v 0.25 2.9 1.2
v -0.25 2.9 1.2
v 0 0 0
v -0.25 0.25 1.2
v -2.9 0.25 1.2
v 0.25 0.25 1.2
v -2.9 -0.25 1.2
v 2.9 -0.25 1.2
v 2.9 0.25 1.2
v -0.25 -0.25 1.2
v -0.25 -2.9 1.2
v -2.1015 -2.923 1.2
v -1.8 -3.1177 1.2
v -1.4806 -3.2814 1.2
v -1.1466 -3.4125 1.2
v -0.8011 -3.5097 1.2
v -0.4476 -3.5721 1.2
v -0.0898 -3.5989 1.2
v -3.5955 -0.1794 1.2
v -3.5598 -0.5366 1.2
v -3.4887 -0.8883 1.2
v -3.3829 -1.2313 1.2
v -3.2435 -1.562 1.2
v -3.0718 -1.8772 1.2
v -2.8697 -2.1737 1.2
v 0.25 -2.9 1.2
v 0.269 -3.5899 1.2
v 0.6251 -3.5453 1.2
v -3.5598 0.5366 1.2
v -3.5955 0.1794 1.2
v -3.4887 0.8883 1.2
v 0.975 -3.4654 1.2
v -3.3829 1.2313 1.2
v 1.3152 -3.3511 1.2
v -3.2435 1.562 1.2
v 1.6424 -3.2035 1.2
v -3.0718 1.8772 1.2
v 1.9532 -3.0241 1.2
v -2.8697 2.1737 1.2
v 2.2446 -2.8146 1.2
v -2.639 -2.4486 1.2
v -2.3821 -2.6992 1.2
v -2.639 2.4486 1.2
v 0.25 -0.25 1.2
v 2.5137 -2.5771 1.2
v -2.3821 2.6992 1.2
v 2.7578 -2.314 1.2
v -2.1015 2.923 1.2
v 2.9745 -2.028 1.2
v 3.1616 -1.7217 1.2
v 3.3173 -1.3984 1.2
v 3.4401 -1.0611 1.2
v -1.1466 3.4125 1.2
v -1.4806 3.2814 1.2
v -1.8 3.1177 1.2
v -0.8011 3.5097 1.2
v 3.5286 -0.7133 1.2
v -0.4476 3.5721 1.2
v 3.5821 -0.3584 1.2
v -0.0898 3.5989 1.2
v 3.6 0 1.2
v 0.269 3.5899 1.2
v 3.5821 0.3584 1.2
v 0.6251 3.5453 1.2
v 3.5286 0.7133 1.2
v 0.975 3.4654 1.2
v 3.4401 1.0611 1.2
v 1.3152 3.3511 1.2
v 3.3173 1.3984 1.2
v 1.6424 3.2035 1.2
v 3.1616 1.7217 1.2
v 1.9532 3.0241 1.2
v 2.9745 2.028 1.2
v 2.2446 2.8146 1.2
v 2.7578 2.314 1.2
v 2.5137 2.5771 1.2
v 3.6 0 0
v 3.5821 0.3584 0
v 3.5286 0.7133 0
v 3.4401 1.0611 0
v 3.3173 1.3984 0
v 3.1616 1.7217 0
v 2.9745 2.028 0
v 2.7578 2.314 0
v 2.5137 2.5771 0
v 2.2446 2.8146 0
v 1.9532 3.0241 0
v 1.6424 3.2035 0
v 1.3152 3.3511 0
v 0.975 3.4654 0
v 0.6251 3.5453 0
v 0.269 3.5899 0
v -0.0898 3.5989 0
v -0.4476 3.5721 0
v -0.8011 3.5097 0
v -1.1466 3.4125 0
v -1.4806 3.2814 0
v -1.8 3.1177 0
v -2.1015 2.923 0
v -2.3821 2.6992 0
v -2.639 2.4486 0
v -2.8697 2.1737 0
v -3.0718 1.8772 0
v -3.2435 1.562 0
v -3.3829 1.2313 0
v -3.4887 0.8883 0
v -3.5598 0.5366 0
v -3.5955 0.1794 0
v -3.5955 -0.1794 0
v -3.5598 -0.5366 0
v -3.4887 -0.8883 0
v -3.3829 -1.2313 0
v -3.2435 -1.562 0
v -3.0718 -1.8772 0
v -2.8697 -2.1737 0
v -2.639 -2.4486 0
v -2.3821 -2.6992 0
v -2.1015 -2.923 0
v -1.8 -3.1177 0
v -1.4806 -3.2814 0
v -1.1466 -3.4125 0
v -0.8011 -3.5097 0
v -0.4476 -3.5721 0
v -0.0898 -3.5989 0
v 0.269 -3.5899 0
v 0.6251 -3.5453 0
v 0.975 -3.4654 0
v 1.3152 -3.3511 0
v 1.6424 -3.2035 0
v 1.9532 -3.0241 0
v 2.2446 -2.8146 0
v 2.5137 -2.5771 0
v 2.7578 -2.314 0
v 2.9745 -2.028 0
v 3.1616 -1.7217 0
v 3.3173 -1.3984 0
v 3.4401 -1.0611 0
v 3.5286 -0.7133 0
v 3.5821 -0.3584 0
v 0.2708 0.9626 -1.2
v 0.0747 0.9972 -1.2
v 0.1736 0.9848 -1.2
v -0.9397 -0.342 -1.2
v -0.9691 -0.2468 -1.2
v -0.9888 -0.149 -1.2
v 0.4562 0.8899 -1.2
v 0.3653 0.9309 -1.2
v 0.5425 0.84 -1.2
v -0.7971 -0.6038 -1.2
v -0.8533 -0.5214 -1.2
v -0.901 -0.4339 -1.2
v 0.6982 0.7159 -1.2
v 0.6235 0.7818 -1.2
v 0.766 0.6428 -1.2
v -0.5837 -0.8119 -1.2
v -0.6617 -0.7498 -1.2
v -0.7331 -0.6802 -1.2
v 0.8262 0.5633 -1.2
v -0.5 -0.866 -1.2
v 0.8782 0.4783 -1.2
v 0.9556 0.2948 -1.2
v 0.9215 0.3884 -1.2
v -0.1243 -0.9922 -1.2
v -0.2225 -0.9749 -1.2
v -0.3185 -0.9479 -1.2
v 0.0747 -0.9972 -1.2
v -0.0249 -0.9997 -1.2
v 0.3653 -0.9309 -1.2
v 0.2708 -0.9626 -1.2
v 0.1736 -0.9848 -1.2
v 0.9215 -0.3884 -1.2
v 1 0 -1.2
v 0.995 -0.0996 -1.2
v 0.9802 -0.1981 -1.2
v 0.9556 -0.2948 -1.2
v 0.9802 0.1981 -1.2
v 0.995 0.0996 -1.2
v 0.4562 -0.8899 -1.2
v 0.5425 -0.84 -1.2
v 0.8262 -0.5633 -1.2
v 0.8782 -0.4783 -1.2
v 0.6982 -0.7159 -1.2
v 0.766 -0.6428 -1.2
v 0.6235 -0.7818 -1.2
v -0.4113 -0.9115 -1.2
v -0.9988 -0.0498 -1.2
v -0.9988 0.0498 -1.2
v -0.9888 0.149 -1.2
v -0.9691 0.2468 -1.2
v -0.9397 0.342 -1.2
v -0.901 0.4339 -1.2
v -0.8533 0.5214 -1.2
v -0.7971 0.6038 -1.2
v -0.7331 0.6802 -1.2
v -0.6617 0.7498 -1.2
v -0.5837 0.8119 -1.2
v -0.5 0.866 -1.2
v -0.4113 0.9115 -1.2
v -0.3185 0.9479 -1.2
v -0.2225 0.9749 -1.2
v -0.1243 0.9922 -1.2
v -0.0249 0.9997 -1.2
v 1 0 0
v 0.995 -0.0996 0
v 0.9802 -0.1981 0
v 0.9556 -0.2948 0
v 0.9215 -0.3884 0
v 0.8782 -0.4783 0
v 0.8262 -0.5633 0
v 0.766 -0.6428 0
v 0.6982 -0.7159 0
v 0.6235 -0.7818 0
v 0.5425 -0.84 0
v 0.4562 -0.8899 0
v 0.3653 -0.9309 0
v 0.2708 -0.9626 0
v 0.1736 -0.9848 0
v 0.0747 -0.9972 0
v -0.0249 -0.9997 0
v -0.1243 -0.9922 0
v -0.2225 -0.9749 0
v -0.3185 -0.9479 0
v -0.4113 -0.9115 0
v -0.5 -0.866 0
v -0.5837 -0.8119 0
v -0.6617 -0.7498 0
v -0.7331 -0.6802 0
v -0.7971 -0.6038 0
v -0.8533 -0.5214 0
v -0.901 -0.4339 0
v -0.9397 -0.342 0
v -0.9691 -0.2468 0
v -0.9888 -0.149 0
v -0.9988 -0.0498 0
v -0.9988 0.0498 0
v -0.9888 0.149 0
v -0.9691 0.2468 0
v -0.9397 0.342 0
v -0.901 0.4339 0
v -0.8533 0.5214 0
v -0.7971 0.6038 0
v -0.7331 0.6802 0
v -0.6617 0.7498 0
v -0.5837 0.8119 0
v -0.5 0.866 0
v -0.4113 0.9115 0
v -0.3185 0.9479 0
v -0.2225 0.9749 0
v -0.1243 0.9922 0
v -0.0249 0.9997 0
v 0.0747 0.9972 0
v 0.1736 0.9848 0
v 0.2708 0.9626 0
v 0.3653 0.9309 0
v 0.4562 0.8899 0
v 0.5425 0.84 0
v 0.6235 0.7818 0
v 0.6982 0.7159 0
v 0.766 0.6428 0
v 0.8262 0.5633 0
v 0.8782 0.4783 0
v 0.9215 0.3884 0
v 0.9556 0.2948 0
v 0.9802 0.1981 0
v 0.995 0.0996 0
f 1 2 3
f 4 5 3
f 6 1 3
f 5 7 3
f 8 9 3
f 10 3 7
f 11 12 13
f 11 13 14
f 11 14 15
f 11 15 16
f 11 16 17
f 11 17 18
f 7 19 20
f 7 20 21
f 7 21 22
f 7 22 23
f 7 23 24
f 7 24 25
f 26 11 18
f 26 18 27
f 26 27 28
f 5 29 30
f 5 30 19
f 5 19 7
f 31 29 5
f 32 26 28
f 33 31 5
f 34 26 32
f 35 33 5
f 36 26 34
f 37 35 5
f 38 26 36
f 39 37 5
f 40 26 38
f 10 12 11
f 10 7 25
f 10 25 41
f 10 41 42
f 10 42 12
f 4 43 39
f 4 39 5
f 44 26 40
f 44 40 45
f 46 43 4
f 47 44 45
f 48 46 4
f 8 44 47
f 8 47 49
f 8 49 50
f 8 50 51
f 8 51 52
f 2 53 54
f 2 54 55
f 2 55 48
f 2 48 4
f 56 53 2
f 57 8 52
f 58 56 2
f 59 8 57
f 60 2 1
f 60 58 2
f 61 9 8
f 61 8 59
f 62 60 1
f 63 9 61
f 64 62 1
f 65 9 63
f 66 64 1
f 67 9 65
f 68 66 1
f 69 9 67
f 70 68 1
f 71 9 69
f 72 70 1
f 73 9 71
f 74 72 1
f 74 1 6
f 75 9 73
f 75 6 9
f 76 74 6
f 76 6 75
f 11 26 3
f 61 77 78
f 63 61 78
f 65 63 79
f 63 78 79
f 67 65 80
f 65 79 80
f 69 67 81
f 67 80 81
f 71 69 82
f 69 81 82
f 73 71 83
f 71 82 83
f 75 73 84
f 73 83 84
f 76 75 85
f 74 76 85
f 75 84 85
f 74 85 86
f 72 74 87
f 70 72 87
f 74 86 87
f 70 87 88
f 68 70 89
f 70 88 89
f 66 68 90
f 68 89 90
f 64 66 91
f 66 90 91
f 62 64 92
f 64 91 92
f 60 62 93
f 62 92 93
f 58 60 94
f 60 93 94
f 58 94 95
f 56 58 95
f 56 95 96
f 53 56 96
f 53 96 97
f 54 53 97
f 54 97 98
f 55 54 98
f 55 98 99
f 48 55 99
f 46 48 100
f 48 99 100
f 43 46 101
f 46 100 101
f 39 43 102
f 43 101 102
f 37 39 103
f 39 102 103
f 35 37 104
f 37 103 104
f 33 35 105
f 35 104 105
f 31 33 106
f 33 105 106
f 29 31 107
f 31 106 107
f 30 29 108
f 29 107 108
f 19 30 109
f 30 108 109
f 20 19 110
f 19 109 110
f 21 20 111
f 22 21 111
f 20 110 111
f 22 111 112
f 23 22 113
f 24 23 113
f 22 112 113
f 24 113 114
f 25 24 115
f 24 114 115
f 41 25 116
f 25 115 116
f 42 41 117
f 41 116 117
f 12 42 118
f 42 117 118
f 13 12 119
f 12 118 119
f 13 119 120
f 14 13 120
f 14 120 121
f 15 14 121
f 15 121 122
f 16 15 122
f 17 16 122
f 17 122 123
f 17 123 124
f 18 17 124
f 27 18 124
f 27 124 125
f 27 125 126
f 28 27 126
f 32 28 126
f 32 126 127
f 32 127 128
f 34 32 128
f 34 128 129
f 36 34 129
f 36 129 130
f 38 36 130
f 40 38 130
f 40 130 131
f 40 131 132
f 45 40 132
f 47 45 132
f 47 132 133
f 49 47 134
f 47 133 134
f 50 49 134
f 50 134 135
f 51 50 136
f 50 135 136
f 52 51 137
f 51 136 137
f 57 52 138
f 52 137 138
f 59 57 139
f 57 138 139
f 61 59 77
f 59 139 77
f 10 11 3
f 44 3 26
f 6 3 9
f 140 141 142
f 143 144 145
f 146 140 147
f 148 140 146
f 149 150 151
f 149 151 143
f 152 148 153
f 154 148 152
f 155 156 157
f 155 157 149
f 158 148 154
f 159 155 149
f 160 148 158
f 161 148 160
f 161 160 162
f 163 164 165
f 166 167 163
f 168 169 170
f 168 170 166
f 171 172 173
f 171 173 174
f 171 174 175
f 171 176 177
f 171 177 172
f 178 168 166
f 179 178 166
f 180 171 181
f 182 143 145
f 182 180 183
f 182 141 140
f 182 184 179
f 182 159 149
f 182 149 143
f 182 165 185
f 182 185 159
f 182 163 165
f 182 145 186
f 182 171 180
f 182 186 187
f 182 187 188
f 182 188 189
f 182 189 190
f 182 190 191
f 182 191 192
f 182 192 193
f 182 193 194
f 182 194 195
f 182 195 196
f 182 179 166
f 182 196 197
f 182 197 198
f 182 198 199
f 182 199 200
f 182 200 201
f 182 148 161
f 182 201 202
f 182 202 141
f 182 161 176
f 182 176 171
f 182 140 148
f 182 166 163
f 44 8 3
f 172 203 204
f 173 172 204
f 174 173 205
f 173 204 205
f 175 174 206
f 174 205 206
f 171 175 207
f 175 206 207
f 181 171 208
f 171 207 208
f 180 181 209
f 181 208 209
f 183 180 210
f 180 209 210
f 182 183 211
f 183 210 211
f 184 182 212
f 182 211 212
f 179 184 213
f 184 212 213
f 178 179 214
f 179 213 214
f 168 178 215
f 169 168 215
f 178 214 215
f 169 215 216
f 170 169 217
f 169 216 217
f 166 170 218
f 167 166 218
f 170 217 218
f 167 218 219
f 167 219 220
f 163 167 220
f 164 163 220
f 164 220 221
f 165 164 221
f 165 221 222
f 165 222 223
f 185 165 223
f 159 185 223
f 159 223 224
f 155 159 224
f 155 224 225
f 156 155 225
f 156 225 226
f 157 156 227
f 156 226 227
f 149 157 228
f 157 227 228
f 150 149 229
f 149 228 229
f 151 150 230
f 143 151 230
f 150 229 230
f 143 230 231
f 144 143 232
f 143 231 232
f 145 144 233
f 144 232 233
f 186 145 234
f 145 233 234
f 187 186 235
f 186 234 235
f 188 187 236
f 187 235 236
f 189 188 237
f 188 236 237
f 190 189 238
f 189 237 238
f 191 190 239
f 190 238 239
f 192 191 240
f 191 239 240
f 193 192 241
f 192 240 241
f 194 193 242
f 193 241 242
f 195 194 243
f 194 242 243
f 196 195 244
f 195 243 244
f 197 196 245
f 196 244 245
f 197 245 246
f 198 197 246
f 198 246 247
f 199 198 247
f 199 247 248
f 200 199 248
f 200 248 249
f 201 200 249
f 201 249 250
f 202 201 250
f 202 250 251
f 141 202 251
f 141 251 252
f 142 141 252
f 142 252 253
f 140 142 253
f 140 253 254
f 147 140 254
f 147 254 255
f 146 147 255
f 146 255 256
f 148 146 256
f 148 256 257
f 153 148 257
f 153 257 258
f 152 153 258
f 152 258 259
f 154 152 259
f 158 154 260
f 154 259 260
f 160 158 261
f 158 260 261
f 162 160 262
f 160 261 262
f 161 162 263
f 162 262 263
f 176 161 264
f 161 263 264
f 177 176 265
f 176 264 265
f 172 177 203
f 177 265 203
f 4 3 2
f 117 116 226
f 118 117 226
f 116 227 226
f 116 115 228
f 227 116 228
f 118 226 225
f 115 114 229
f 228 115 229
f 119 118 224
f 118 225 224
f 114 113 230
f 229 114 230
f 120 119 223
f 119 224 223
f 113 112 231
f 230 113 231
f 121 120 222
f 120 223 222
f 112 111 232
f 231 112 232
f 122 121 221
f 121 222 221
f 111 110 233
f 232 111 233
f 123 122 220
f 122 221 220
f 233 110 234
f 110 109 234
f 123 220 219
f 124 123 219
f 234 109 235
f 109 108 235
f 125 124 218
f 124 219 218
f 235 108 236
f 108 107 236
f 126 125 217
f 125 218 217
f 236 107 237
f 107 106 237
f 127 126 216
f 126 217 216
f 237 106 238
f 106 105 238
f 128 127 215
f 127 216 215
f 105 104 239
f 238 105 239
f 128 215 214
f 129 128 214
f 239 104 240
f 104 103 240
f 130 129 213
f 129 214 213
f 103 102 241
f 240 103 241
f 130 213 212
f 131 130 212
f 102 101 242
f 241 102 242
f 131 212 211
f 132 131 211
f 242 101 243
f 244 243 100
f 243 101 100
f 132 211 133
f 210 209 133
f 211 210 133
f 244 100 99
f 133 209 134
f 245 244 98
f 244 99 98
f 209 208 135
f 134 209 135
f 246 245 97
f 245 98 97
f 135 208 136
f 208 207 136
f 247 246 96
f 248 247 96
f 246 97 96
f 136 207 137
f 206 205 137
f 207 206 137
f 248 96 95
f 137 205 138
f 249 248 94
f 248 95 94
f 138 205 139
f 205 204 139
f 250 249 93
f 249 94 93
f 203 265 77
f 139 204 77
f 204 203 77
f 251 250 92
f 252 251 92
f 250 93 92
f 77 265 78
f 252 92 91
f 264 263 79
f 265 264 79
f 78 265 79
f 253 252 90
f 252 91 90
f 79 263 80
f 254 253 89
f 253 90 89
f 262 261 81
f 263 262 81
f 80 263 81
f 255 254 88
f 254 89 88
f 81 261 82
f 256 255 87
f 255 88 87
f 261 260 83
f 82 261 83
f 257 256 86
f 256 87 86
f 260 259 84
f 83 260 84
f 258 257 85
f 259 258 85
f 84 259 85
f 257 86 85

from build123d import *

# Parameters (mm, degrees)
SKETCH_2_R               = 3.6
EXTRUDE_1_DEPTH          = 1.2
SKETCH_3_R               = 1
EXTRUDE_2_DEPTH          = 1.2
PATTERN_CIRCULAR_2_COUNT = 4


with BuildPart() as part:
    # 草圖2 → 伸長1 (new body)
    with BuildSketch(Plane.XY):
        Circle(SKETCH_2_R)
    extrude(amount=EXTRUDE_1_DEPTH)

    # 草圖3 → 伸長2 (add)
    with BuildSketch(Plane(origin=(0, 0, 0), x_dir=(-1, 0, 0), z_dir=(0, 0, -1))):
        with Locations(Location((0, 0, 0), (0, 0, 180))):
            Circle(SKETCH_3_R)
    extrude(amount=EXTRUDE_2_DEPTH)

    # 草圖4 → 除料-疊層拉伸1 section 0
    with BuildSketch(Plane.XY.offset(1.2), mode=Mode.PRIVATE) as loft_1_s0:
        with BuildLine():
            Line((-0.25, 2.9), (0.25, 2.9))
            Line((0.25, 2.9), (0.25, -2.9))
            Line((0.25, -2.9), (-0.25, -2.9))
            Line((-0.25, -2.9), (-0.25, 2.9))
        make_face()
    loft_1 = loft([loft_1_s0.sketch, Vertex(0, 0, 0)], mode=Mode.SUBTRACT)

    # 環狀複製排列2: 除料-疊層拉伸1 ×4 about axis
    pattern_circular_2_axis = Axis((0, 0, 0), (0, 0, 1))
    for i in range(1, PATTERN_CIRCULAR_2_COUNT):
        add(loft_1.rotate(pattern_circular_2_axis, i * 360 / PATTERN_CIRCULAR_2_COUNT), mode=Mode.SUBTRACT)


solid = part.part
